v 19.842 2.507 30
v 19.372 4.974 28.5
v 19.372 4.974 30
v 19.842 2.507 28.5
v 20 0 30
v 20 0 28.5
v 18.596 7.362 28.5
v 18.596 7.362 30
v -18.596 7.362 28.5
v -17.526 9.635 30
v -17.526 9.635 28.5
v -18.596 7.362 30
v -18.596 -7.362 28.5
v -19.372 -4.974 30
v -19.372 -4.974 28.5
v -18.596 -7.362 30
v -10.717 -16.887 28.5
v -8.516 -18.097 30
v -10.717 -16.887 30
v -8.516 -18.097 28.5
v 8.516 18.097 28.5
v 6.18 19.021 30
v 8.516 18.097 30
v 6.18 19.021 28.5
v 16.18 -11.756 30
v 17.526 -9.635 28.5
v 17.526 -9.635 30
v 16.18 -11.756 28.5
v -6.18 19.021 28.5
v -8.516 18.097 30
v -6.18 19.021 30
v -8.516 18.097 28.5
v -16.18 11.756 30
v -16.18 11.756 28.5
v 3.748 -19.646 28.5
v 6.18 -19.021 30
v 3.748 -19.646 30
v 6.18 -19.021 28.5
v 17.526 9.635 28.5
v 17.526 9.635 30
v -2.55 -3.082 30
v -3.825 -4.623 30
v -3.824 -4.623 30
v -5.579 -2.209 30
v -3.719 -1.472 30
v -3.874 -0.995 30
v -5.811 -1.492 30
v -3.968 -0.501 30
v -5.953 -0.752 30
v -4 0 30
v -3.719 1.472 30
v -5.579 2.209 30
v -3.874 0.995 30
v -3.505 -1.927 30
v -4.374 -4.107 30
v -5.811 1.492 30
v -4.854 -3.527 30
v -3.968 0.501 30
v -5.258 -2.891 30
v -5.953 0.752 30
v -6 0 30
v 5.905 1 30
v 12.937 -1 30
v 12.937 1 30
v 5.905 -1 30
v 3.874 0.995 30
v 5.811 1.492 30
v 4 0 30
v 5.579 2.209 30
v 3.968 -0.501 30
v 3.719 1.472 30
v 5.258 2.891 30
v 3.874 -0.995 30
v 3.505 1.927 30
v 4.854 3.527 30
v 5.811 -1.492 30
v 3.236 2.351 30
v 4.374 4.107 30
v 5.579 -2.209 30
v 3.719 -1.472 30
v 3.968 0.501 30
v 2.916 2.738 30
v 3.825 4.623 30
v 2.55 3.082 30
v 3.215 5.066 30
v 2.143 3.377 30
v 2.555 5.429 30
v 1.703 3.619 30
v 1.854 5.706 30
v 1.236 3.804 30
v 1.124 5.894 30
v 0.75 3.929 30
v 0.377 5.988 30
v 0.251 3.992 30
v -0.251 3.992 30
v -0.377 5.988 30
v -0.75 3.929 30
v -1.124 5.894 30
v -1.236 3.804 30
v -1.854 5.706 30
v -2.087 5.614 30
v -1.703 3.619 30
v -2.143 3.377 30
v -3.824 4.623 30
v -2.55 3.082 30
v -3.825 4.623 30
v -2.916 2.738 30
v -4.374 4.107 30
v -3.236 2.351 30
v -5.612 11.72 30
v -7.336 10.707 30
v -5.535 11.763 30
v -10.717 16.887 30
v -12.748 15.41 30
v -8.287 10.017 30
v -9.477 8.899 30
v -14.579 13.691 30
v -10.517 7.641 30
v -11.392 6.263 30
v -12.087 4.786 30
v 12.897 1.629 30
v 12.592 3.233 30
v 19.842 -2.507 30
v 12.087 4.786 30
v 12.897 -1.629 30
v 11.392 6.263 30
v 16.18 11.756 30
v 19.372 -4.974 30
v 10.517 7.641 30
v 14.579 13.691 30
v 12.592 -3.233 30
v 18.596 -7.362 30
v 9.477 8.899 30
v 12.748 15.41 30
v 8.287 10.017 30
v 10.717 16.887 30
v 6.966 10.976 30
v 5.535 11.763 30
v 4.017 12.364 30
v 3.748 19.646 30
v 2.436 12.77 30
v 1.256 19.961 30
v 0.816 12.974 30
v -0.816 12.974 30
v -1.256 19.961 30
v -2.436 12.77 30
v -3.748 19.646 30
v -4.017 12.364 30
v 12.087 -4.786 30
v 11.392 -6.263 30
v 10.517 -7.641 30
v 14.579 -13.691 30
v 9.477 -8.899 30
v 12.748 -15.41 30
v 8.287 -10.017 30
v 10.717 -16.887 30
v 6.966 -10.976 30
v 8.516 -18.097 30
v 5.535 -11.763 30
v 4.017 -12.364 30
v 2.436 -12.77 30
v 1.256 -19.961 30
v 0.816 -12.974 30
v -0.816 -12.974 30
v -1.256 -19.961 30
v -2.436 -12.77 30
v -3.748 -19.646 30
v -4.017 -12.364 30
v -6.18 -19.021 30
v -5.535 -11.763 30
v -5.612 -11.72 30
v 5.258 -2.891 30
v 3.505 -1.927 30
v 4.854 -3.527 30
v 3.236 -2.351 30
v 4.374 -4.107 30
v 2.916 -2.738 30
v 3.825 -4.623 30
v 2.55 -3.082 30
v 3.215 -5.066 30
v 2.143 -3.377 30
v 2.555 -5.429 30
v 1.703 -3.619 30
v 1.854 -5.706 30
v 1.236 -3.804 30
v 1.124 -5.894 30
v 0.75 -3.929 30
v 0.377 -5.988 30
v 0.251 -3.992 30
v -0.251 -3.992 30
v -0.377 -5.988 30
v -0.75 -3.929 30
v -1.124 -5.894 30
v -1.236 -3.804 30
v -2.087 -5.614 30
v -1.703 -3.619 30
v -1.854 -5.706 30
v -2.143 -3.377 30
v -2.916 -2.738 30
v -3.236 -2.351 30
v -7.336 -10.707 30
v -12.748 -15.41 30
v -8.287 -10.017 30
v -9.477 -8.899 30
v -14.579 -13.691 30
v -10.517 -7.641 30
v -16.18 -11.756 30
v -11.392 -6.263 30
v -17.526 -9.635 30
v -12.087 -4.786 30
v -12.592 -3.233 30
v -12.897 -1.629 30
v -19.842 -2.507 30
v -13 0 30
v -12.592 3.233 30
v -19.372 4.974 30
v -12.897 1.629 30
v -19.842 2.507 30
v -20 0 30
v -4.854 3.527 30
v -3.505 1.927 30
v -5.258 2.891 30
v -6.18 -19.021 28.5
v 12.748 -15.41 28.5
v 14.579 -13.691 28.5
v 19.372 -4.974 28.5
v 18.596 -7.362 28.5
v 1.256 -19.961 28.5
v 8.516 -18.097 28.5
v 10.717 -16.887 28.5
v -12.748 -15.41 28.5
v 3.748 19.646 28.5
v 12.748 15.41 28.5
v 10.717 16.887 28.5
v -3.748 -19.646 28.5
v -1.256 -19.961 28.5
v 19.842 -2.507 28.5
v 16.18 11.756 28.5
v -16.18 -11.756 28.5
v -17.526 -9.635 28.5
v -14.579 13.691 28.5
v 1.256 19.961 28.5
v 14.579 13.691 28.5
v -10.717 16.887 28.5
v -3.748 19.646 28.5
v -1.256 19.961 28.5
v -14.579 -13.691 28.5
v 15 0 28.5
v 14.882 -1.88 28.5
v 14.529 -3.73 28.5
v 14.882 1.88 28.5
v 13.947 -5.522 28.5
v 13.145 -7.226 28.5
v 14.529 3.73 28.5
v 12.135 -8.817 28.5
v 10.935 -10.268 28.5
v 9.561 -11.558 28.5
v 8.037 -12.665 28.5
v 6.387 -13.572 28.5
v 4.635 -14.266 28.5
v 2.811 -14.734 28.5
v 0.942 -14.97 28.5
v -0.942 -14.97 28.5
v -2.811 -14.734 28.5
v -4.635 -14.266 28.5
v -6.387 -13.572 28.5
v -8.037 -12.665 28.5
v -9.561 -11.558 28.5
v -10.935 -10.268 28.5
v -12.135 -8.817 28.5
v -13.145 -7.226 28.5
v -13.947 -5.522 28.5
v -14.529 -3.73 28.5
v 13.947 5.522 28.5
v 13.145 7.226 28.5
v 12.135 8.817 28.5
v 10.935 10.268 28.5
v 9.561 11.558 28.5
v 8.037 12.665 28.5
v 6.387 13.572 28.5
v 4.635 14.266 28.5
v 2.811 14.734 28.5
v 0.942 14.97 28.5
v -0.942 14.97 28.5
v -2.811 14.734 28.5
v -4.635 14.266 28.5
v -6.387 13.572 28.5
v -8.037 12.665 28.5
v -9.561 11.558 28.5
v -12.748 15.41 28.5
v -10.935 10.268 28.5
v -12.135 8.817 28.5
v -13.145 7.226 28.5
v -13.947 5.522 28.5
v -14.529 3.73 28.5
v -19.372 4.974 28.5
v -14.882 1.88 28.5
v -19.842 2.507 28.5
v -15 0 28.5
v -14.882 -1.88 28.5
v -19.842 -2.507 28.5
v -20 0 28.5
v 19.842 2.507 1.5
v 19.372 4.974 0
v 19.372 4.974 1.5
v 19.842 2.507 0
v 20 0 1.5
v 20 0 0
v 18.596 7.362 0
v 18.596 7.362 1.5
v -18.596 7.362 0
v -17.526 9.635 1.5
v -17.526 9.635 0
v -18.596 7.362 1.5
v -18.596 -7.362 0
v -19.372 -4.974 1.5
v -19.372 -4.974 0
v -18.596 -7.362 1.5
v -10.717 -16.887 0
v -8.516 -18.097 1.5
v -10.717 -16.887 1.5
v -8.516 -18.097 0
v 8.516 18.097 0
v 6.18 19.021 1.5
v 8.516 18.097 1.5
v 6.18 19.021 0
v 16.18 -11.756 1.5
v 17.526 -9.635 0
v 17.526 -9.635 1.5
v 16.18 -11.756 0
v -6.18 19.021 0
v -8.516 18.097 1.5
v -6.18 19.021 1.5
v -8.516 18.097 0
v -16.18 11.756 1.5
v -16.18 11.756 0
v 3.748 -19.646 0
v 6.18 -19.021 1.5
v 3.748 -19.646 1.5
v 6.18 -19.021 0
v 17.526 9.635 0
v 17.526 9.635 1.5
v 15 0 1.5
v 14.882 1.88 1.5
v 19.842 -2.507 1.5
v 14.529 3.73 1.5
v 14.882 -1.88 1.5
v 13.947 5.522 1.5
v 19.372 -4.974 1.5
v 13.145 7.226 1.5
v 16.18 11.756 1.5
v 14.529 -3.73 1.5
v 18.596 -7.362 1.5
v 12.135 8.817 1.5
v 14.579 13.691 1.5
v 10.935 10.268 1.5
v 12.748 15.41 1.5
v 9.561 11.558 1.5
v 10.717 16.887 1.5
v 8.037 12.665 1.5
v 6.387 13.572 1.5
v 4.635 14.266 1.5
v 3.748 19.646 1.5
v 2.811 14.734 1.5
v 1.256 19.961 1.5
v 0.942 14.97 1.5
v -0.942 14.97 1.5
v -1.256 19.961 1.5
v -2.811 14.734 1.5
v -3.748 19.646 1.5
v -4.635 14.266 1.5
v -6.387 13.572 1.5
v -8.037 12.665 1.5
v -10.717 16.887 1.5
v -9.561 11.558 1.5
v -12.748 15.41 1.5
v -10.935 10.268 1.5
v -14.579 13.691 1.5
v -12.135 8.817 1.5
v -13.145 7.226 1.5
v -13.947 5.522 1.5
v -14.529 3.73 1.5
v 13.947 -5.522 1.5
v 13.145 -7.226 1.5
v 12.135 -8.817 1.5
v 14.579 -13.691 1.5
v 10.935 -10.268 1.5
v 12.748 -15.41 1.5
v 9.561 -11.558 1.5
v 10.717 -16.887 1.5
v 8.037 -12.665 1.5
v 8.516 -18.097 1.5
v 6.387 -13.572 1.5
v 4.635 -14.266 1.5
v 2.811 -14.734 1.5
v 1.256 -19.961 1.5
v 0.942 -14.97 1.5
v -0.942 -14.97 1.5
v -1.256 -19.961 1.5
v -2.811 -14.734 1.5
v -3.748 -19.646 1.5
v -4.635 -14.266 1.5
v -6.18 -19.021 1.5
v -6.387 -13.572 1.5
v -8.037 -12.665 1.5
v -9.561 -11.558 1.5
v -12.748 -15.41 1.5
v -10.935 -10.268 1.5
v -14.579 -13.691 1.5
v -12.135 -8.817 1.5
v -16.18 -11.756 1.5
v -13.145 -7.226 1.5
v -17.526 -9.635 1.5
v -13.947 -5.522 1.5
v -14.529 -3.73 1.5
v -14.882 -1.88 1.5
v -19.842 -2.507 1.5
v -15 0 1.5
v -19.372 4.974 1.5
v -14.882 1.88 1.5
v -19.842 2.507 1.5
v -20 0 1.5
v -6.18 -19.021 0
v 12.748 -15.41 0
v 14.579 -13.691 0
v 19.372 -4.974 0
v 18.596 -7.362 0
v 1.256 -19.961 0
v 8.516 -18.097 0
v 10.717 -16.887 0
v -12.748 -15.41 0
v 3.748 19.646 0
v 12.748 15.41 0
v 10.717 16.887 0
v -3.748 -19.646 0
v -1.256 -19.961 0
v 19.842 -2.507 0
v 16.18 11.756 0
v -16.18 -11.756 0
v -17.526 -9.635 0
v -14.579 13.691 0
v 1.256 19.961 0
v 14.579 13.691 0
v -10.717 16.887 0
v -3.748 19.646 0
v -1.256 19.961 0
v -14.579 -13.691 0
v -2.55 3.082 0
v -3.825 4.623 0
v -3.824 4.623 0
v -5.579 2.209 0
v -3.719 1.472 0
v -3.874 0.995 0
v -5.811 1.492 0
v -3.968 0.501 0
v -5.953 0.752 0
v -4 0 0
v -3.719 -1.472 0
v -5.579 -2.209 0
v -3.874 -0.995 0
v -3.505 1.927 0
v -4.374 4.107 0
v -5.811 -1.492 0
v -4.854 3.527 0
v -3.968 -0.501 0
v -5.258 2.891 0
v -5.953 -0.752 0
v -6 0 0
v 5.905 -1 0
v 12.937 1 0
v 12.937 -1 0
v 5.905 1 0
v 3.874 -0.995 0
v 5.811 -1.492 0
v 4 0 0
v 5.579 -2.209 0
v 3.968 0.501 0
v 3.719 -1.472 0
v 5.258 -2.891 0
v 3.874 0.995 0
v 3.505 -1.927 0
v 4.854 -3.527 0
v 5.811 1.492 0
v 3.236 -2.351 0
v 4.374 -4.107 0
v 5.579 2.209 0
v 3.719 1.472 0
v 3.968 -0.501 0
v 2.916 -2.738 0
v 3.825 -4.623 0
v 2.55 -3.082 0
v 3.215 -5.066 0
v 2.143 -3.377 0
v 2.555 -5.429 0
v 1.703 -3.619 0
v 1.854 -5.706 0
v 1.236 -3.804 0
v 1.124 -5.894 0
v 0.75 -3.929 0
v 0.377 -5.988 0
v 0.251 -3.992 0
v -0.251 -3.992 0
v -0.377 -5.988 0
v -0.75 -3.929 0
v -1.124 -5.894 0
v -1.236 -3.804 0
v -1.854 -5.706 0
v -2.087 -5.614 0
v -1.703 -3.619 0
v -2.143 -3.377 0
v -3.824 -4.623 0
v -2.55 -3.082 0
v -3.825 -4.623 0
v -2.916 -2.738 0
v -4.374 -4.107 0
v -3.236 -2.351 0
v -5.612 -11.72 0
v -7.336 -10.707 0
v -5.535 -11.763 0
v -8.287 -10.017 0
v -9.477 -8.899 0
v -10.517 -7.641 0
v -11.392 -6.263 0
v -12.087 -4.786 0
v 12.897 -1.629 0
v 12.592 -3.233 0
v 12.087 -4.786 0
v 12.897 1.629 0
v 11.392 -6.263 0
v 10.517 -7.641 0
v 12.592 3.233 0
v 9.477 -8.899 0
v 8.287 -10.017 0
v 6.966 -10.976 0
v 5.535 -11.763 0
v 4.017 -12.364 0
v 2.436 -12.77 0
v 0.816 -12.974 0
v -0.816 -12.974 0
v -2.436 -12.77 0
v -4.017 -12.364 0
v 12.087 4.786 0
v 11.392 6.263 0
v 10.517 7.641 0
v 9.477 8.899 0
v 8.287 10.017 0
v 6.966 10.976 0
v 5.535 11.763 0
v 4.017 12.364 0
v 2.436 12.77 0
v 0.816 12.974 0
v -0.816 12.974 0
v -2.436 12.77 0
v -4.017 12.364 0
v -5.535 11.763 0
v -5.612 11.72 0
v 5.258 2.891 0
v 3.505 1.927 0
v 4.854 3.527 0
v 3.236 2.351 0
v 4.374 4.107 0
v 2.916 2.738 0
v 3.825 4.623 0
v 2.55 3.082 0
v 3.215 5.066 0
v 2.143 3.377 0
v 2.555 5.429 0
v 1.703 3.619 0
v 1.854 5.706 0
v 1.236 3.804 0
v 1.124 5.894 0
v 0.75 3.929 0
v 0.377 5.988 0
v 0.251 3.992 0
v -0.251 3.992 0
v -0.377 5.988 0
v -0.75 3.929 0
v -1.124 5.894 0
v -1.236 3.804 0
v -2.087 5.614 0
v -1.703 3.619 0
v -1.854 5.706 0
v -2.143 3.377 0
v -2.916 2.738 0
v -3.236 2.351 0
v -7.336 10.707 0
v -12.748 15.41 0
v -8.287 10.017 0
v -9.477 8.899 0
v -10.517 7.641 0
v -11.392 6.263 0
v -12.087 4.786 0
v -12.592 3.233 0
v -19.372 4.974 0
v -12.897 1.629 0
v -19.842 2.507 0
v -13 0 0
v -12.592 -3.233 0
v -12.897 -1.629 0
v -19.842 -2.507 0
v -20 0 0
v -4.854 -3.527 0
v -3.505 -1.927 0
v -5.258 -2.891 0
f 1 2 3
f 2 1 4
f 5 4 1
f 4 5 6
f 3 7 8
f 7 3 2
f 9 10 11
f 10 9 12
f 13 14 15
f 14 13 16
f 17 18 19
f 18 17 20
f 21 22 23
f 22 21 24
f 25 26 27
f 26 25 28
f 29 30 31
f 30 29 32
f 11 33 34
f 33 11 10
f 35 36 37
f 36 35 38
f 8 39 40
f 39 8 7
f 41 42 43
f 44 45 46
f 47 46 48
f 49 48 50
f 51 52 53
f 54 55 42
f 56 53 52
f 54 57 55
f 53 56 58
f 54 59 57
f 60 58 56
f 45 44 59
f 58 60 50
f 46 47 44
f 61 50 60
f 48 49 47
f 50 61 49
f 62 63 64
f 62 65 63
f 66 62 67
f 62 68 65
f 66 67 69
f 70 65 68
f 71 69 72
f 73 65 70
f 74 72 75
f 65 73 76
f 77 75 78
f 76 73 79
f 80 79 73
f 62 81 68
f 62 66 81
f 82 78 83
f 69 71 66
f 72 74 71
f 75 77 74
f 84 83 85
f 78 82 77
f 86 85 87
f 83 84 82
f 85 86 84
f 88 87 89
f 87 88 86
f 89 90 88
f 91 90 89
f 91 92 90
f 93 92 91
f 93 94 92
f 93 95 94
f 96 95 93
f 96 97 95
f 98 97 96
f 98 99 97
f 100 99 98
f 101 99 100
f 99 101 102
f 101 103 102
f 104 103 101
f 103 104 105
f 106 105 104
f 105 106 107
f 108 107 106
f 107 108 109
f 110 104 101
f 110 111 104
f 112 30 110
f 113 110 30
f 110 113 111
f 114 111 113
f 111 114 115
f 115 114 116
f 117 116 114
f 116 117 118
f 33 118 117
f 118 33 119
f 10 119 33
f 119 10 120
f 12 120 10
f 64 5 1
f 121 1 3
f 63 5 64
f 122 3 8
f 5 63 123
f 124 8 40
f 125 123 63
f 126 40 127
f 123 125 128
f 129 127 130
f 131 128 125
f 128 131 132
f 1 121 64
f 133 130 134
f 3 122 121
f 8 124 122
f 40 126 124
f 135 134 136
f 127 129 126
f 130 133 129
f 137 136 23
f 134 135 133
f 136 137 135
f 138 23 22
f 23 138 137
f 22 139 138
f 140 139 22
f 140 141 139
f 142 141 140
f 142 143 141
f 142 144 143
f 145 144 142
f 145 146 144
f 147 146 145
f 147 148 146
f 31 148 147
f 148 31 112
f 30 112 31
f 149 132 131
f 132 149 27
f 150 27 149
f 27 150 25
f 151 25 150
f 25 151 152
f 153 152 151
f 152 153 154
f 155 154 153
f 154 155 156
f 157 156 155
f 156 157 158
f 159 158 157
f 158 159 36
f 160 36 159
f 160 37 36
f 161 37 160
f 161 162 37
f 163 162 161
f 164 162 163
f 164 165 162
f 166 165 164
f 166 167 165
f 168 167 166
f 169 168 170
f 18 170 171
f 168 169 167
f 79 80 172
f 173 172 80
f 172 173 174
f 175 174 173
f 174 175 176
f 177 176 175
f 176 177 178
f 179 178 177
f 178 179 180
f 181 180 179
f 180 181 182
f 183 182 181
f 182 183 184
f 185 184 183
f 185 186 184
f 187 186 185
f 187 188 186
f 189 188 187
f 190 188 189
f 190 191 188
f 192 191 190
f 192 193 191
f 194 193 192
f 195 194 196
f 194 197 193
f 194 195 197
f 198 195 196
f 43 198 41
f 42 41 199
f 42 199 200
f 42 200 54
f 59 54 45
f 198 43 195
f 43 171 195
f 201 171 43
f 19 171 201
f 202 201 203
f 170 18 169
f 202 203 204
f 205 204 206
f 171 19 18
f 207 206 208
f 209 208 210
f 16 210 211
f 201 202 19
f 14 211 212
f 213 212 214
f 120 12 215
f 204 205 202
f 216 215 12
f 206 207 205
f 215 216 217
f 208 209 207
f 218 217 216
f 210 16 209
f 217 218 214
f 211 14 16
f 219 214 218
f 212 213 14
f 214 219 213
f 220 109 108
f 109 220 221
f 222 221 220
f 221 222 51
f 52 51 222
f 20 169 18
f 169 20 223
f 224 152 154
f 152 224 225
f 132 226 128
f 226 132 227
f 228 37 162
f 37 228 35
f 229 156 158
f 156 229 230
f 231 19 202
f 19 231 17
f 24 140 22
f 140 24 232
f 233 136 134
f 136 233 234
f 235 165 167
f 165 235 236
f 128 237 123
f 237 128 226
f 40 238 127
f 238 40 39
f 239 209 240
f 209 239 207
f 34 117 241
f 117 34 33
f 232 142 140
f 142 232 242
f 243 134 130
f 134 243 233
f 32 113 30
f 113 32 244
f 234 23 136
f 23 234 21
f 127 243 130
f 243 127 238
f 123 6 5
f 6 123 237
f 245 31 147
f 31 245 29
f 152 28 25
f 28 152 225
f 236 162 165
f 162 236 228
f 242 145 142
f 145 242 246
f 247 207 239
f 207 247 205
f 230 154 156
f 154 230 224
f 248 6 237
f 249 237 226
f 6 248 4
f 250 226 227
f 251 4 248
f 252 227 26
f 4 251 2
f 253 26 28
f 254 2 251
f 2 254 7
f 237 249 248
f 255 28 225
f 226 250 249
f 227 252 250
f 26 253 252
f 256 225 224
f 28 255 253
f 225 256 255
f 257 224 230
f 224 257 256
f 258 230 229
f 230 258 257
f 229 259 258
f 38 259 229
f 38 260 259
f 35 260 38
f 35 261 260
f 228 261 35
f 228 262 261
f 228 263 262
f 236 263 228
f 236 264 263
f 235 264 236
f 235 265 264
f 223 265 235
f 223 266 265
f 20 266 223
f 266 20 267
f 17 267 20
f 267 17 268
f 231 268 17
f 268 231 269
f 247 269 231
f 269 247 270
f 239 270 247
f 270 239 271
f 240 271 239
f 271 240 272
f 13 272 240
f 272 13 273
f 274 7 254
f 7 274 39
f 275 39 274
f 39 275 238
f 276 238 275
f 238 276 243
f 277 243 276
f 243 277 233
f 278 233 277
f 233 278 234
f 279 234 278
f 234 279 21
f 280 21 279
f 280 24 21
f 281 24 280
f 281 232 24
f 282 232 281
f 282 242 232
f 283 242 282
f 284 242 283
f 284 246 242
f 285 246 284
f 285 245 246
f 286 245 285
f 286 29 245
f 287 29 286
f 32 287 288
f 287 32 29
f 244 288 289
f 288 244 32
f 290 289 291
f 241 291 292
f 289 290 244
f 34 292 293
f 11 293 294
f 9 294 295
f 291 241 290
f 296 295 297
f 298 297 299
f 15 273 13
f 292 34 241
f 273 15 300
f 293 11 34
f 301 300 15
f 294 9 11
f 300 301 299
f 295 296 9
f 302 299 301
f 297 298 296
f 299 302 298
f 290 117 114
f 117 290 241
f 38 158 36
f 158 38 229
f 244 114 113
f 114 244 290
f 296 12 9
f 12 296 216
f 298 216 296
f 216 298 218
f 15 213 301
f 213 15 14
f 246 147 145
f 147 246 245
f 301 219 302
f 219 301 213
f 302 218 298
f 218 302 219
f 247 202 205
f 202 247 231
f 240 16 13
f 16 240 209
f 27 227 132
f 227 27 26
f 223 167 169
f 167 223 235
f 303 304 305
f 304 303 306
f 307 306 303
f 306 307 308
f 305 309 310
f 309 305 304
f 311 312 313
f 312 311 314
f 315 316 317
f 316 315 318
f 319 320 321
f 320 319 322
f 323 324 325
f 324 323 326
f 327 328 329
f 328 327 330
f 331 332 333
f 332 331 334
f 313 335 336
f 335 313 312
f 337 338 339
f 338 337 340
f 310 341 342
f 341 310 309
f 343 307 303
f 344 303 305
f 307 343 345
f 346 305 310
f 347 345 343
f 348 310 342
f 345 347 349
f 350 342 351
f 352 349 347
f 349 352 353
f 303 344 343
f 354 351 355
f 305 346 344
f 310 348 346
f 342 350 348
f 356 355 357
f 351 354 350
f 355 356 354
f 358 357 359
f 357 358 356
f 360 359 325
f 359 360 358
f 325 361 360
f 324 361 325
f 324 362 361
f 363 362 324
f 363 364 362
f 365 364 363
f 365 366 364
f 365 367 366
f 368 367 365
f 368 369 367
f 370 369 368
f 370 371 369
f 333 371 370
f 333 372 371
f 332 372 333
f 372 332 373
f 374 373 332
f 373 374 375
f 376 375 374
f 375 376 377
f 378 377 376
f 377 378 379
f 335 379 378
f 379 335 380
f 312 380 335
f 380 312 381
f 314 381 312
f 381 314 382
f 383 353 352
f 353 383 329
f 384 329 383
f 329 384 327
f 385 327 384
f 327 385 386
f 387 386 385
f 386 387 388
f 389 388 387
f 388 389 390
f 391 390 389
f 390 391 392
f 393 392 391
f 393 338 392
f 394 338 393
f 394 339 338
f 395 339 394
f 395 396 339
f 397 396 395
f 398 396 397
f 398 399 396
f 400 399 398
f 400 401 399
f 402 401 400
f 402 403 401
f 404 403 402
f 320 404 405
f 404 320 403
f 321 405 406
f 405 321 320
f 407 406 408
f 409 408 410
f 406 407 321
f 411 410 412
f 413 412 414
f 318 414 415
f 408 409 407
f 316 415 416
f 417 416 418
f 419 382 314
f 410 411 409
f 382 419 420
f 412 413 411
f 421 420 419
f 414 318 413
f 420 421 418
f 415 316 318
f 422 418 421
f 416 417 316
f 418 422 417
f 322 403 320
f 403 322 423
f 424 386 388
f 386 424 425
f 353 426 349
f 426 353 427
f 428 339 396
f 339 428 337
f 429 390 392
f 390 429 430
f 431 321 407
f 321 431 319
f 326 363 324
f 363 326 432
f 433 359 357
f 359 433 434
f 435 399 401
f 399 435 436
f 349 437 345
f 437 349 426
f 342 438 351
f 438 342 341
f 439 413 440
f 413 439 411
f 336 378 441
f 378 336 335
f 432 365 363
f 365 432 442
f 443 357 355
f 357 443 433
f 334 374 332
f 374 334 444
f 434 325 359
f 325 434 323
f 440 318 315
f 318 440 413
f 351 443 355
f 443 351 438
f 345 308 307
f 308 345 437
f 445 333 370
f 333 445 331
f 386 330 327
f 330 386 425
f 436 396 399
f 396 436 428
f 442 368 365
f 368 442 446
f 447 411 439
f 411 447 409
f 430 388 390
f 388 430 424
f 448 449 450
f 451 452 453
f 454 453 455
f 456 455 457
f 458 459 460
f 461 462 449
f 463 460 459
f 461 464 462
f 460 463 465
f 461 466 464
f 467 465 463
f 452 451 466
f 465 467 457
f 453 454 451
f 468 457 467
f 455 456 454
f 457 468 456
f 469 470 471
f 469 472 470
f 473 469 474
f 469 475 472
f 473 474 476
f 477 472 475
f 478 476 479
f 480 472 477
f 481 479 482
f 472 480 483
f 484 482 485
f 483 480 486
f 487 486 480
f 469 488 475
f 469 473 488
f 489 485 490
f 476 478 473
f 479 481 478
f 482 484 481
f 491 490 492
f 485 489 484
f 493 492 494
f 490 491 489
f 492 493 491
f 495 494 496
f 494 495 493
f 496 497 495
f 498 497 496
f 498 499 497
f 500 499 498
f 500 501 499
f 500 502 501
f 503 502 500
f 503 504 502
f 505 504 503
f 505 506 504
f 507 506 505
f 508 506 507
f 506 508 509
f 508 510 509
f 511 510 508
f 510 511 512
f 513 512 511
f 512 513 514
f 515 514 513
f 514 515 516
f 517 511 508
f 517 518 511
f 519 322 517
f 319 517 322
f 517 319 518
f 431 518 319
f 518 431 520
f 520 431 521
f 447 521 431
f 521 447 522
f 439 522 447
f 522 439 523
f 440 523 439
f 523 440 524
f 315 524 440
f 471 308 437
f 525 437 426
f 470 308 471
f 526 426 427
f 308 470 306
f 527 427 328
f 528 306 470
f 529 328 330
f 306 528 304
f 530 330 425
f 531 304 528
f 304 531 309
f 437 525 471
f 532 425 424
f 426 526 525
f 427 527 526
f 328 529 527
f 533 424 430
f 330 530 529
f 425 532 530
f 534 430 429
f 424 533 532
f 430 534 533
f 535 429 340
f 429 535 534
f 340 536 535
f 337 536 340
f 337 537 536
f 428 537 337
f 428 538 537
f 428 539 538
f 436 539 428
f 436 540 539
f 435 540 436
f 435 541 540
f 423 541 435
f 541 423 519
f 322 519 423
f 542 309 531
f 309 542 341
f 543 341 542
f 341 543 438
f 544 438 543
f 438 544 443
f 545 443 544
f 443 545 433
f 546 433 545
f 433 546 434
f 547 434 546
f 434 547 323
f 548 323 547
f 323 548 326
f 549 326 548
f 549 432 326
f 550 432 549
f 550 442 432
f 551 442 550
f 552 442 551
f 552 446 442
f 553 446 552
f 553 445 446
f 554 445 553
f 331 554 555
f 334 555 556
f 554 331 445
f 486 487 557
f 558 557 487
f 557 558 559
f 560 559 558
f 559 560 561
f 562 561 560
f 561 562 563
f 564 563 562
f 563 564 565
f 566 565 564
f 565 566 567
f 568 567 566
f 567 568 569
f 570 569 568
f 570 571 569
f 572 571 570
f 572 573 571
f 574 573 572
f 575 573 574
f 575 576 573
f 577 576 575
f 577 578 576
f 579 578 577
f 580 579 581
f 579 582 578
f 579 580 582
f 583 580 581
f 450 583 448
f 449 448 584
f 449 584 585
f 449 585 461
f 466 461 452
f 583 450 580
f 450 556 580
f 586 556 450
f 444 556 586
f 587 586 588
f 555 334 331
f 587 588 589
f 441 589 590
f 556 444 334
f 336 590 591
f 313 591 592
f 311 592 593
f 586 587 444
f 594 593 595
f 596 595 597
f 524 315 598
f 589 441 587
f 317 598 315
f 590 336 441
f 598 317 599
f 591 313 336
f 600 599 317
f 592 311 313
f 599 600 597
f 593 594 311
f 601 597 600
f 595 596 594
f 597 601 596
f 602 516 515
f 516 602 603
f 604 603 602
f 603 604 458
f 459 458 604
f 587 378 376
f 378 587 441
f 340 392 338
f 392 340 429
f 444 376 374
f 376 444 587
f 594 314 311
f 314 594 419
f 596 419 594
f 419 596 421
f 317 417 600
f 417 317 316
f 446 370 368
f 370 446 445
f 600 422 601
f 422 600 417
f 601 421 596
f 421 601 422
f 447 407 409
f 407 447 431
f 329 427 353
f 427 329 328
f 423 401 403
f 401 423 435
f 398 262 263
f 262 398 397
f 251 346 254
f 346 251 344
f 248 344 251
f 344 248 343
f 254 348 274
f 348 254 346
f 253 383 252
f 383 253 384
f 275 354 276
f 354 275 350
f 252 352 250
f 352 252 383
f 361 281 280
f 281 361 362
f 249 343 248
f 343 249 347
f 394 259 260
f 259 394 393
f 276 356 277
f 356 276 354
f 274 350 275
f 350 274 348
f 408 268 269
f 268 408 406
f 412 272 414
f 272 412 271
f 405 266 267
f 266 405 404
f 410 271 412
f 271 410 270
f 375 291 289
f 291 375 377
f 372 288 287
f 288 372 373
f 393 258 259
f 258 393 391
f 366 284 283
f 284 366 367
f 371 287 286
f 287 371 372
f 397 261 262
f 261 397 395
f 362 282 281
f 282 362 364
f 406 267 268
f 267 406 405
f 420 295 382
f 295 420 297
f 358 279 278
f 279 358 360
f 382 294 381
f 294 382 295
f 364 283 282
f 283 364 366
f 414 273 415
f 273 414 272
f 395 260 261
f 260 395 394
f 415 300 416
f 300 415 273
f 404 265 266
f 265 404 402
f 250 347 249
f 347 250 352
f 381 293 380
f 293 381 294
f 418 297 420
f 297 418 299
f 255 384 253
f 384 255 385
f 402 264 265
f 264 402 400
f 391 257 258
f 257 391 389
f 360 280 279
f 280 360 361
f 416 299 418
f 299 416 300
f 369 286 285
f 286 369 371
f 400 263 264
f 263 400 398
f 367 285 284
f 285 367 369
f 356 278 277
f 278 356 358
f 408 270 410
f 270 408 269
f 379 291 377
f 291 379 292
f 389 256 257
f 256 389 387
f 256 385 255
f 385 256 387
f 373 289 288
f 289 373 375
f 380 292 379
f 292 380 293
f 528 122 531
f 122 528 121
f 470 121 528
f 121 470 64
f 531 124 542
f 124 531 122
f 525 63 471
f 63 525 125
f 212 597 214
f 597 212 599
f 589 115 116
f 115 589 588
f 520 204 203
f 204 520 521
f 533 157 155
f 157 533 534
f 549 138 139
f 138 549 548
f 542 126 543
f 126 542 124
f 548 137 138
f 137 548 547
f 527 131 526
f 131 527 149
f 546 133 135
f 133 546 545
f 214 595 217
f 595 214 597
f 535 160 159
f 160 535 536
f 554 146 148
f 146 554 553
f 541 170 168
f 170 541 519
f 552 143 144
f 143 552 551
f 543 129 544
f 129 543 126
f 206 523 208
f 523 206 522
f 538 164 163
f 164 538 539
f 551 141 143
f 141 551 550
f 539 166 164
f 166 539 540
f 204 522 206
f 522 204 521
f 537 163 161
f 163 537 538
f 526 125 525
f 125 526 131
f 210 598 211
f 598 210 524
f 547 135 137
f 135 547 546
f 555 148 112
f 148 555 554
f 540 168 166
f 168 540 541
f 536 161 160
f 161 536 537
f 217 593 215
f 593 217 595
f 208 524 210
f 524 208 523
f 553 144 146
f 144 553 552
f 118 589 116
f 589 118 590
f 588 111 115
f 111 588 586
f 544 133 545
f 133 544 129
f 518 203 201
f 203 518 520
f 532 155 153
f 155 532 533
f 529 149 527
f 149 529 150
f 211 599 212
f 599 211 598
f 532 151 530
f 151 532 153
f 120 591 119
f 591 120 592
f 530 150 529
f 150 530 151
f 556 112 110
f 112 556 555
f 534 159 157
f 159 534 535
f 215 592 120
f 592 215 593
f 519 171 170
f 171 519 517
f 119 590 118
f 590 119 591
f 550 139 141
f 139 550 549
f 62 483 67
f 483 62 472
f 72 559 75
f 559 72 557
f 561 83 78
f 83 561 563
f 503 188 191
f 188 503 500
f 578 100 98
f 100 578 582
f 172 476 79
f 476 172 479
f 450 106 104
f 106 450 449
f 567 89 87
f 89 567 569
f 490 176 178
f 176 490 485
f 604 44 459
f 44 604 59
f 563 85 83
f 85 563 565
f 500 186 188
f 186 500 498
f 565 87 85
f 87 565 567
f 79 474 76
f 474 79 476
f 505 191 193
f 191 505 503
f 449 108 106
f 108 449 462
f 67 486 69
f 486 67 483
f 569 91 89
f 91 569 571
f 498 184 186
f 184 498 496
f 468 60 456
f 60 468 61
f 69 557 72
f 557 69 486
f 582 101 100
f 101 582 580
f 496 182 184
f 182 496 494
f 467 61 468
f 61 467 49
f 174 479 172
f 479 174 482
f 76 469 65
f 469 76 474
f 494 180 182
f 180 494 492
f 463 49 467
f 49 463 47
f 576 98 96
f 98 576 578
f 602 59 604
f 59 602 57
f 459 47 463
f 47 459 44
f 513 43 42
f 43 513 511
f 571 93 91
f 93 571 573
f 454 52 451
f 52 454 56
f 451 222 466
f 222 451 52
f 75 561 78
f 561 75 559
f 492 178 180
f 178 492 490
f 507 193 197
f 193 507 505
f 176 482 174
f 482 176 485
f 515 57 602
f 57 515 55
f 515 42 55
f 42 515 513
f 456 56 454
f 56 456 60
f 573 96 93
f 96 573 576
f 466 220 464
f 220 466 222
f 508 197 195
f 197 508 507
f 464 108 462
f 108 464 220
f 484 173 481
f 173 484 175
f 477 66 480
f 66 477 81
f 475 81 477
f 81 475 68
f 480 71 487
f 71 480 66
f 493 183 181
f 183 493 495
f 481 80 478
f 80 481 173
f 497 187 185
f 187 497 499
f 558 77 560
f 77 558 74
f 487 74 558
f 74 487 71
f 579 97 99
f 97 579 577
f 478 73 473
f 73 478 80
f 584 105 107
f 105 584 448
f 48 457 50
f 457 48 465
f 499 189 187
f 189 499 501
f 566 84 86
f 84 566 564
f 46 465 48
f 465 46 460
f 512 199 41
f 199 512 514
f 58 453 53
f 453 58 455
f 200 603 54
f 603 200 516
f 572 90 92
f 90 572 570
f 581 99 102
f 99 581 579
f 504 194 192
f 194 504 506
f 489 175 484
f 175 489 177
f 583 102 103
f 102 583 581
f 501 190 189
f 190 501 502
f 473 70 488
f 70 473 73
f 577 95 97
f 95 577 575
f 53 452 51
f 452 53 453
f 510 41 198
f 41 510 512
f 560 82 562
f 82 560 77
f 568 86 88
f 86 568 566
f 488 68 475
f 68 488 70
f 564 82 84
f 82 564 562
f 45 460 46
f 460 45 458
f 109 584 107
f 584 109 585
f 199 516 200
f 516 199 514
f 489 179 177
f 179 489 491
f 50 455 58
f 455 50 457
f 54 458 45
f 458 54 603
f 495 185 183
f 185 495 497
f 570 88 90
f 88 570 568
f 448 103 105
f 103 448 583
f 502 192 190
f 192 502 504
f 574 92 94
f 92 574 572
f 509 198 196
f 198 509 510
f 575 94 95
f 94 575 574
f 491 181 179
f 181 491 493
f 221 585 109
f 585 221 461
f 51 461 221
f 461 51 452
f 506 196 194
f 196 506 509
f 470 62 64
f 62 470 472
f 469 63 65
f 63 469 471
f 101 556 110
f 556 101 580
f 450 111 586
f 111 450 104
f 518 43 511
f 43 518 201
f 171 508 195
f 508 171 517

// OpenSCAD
/*
 * Parametric Flanged Wheel
 */
 
// what diameter hole do we need for the axle
hub_diameter = 8;

// outer diameter of wheel, does not include flange
outer_diameter = 30;

// Height/length through wheel
height = 30;

// How far the flange extends
flange_height = 5;

// how many spokes do we want
spokes = 3;

// Width of all features/walls
feature_width = 2;

// Flange on one side only? (set to 1 to enable)
flange_on_one_side_only = 0;

/*** end of parameters */

outer_width = height;
hub_length = height;
$fn = 50;


// draw me one
wheel(hub_diameter,hub_length,outer_diameter,outer_width,spokes);


// draw the hub with hole for axle
module Hub(hub_radius=4, outer_width=10)
{
	difference() {
		cylinder(r=hub_radius+feature_width, h=outer_width);
		translate([0,0,-2]) cylinder(r=hub_radius,h=outer_width+8);
	}
}

// Draw the rim, with flange_height flange
module Rim(outer_radius=20,outer_width=10)
{
	difference(){
		union(){
            if (flange_on_one_side_only != 1) {
                translate([0,0,outer_width - 1.5]) cylinder(r=outer_radius+flange_height, h=1.5);
            }
			cylinder(r=outer_radius+flange_height, h=1.5);
			cylinder(r=outer_radius, h=outer_width);
		}
		translate([0,0,-2]) cylinder(r=outer_radius-feature_width,h=outer_width+8);
	}
}

// draw the spokes holding rim to hub
module Spokes(hub_radius=4, outer_radius=20, outer_width=10, steps=4)
{
	for (angle=[0:360/steps:360]) {
		rotate([0,0,angle]) {
			translate([hub_radius+1,-1,0]) {
				cube( size=[outer_radius-feature_width-hub_radius,feature_width,outer_width], center=false);
			}
		}
	}
}

module wheel(hub_dia=8,hub_length=10,outer_dia=40,outer_width=10,spokes=6)
{
	hub_radius = hub_dia * 0.5;
	outer_radius = outer_dia * 0.5;
	union() {
		Rim(outer_radius, outer_width);
        translate ([0,0,(outer_width - hub_length) / 2]) {
            Hub(hub_radius, hub_length);
            Spokes(hub_radius, outer_radius, min(hub_length,outer_width), spokes);
        }
	}
}
